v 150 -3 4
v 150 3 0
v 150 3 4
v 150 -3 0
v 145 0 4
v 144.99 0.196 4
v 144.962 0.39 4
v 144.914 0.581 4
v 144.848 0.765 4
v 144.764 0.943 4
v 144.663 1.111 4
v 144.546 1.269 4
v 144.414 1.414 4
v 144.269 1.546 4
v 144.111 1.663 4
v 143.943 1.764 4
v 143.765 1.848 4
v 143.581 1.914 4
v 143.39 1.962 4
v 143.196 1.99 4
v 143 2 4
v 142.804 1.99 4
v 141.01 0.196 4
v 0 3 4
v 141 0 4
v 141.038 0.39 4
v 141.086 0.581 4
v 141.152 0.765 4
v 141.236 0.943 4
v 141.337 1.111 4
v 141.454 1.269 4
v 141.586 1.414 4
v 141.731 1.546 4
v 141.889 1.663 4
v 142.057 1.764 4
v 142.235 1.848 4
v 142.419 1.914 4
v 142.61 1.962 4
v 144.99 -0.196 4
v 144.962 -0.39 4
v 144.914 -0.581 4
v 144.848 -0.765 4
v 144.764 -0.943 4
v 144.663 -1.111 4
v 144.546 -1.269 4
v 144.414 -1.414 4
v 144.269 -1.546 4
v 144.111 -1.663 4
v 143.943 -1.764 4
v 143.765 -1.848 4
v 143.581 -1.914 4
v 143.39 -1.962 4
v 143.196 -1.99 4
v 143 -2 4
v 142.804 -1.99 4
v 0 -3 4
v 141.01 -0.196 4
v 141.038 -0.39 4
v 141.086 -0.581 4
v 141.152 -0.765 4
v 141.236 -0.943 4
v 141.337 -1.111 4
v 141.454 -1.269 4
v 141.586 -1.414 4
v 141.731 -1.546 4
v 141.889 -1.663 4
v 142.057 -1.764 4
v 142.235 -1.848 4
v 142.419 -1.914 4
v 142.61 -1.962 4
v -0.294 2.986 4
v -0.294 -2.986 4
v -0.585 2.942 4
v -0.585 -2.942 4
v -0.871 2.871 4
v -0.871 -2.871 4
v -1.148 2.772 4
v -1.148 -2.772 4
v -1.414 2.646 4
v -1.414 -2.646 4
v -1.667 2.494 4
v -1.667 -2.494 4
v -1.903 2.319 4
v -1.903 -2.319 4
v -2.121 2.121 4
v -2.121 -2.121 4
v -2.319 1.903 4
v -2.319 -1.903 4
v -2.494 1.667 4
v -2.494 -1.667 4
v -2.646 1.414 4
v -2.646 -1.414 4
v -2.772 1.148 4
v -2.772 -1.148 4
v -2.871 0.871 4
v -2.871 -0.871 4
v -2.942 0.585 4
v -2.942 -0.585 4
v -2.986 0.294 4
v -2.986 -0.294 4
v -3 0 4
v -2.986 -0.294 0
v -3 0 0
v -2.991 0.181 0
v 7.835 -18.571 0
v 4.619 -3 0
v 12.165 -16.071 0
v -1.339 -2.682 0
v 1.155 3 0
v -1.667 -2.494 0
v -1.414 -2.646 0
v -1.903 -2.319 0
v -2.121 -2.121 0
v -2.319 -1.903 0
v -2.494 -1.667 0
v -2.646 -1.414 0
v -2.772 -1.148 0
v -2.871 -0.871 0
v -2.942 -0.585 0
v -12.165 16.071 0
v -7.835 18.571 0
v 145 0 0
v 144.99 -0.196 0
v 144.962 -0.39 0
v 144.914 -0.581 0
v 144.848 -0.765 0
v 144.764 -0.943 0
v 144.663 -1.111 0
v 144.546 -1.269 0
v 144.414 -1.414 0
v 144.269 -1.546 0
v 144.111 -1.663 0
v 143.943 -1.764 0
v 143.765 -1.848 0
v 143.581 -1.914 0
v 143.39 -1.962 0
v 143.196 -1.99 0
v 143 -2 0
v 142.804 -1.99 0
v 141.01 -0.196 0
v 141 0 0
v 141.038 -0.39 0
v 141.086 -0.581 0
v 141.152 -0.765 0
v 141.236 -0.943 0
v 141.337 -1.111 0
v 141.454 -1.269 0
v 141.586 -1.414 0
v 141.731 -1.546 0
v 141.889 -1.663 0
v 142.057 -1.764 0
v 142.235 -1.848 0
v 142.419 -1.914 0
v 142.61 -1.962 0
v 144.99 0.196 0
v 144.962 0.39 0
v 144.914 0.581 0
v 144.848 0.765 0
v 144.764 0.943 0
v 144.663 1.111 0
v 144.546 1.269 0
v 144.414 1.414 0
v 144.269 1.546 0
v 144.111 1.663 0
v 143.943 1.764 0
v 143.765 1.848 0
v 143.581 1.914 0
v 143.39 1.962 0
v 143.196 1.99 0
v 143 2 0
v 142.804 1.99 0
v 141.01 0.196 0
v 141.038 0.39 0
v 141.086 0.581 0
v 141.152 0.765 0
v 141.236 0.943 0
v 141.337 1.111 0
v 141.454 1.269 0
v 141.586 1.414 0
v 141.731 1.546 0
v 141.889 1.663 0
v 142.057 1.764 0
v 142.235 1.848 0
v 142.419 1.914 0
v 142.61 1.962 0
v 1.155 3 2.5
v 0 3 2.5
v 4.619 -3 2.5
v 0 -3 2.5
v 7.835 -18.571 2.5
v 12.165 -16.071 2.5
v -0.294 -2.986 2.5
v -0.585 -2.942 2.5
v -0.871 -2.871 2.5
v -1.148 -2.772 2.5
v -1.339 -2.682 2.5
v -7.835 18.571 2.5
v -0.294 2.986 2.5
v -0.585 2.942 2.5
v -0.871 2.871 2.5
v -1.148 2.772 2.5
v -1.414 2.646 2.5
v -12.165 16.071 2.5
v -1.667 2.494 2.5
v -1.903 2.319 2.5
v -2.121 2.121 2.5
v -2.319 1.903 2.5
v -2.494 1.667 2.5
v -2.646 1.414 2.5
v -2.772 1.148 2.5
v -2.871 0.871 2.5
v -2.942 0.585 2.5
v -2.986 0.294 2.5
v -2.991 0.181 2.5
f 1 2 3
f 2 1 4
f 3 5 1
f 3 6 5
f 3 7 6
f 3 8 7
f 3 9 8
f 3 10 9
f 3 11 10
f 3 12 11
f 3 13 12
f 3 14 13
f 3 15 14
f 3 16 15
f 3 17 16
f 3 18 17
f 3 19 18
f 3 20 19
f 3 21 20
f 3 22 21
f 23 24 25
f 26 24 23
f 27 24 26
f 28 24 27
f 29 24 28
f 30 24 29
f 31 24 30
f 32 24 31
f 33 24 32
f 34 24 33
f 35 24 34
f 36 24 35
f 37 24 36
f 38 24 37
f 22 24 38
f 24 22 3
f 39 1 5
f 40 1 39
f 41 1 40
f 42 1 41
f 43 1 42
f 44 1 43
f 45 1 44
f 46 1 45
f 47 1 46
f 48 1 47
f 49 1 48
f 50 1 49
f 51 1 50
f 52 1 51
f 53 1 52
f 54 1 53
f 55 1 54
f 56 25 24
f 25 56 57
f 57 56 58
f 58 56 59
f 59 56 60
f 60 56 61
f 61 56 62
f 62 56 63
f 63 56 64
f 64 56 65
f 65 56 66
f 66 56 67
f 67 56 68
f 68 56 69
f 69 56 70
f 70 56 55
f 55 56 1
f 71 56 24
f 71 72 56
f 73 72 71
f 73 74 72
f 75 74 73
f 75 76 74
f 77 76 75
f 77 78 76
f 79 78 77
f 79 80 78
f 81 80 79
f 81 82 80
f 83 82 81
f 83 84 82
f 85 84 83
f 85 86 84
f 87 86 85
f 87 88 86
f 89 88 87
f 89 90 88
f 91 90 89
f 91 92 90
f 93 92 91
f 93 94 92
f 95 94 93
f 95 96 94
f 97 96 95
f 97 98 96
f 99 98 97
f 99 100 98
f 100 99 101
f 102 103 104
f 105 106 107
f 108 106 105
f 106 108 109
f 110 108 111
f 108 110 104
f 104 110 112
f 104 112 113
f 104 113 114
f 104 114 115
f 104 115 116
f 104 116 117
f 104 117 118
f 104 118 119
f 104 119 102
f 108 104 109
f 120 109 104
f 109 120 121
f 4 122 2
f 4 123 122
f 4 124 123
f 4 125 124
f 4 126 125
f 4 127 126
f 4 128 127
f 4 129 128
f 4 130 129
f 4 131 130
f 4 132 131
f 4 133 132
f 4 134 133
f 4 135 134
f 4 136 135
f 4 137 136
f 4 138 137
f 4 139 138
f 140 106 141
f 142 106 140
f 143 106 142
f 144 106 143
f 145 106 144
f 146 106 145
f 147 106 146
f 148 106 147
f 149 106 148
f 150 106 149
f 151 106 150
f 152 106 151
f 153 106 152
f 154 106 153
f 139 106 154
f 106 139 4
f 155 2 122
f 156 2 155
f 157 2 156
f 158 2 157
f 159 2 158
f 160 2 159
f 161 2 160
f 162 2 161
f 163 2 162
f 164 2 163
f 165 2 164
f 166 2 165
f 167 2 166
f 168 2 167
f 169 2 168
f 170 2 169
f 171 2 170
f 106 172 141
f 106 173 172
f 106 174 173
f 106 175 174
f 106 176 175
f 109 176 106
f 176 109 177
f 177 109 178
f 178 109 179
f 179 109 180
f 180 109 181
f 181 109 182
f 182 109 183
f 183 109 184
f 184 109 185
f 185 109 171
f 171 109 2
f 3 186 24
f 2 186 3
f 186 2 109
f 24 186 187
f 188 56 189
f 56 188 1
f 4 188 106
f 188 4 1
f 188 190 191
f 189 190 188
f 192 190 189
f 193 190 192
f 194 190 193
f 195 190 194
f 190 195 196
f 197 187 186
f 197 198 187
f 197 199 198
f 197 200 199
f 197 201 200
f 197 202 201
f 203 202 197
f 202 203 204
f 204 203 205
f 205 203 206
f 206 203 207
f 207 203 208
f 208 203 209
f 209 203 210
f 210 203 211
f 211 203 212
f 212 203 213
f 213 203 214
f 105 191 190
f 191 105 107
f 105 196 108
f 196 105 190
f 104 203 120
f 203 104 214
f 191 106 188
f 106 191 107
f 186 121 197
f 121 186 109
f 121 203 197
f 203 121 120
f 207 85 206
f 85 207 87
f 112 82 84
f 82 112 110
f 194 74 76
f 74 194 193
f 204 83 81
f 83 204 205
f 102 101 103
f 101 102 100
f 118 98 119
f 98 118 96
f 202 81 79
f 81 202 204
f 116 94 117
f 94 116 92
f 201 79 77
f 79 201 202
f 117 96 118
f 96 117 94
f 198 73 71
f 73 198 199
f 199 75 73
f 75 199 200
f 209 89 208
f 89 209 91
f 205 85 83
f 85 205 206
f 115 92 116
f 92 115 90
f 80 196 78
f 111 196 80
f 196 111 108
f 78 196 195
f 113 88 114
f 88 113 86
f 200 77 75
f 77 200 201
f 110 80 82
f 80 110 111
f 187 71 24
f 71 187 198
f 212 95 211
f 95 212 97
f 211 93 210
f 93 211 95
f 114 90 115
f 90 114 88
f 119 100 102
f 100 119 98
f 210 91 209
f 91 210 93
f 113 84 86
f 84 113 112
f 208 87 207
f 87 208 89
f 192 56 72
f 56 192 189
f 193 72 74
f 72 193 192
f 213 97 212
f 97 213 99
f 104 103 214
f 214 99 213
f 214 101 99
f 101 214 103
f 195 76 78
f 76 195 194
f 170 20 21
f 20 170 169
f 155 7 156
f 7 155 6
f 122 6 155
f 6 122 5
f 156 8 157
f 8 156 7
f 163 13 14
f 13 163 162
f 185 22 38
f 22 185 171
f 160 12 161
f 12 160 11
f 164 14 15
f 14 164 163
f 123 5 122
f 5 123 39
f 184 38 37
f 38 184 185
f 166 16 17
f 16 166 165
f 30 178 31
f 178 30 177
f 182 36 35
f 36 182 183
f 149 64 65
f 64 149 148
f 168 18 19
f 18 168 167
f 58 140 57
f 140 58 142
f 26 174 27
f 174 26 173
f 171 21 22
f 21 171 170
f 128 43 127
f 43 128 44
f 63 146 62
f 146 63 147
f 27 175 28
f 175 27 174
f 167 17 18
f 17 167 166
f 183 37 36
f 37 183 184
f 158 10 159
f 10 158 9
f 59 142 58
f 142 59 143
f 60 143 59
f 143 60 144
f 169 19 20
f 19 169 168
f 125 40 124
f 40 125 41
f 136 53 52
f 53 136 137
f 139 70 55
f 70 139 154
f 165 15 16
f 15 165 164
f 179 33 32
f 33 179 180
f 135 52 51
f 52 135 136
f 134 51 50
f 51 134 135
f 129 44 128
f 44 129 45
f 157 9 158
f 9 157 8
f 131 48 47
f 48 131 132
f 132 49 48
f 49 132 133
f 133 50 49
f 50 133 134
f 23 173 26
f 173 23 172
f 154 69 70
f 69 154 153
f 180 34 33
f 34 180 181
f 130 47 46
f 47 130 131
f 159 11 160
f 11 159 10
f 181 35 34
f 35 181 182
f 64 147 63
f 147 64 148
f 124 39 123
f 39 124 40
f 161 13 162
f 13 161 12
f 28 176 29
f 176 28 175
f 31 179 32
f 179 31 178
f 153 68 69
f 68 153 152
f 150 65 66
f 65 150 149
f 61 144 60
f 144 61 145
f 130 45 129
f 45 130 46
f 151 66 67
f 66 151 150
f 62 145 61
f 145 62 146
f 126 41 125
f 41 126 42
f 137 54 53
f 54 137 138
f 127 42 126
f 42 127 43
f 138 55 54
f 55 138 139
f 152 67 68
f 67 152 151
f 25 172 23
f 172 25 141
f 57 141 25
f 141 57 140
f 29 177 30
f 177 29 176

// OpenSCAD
// L-shaped (hockey-stick) cell spreader, printed lying flat (z=0 is the bed side)
$fn = 64;

// Handle (long bar): x = 0 to 150, y = -3 to 3, z = 0 to 4
handle_len   = 150;   // mm, x = 0 to 150
handle_w     = 6;     // mm, y = -3 to 3
handle_t     = 4;     // mm, z = 0 to 4

// Spreading foot (thin bar, 120° CCW from +X)
foot_len     = 40;    // mm, along its centre line
foot_w       = 5;     // mm, transverse width
foot_t       = 2.5;   // mm, z = 0 to 2.5 (smooth bed side)
foot_angle   = 120;   // deg, CCW from +X, seen from above

// Round boss joining the bars at the origin
boss_d       = 6;     // mm diameter
boss_t       = 4;     // mm tall

// Hanging hole through the handle
hole_d       = 4;     // mm diameter
hole_x       = 143;   // mm, centre x position
hole_y       = 0;     // mm, centre y position

// ---- Handle: x 0..150, y -3..3, z 0..4 (origin at the joint) ----
module handle() { translate([0, -handle_w/2, 0])
    cube([handle_len, handle_w, handle_t]); }

// ---- Spreading foot: 40 mm bar, 120° CCW, z 0..2.5 ----
// Local frame: +x_local = 120° direction, +y_local = 120°+90° (transverse)
module foot() { rotate([0, 0, foot_angle])
    translate([-foot_len/2, -foot_w/2, 0])
    cube([foot_len, foot_w, foot_t]); }

// ---- Round boss at the origin ----
module boss() { cylinder(h = boss_t, d = boss_d); }

// ---- Hanging hole through the handle (extends past faces) ----
module hole() { translate([hole_x, hole_y, -1])
    cylinder(h = handle_t + 2, d = hole_d); }

// ---- Assemble: union of bars + boss, then subtract the hole ----
difference() {
    union() {
        handle();
        foot();
        boss();
    }
    hole();
}
